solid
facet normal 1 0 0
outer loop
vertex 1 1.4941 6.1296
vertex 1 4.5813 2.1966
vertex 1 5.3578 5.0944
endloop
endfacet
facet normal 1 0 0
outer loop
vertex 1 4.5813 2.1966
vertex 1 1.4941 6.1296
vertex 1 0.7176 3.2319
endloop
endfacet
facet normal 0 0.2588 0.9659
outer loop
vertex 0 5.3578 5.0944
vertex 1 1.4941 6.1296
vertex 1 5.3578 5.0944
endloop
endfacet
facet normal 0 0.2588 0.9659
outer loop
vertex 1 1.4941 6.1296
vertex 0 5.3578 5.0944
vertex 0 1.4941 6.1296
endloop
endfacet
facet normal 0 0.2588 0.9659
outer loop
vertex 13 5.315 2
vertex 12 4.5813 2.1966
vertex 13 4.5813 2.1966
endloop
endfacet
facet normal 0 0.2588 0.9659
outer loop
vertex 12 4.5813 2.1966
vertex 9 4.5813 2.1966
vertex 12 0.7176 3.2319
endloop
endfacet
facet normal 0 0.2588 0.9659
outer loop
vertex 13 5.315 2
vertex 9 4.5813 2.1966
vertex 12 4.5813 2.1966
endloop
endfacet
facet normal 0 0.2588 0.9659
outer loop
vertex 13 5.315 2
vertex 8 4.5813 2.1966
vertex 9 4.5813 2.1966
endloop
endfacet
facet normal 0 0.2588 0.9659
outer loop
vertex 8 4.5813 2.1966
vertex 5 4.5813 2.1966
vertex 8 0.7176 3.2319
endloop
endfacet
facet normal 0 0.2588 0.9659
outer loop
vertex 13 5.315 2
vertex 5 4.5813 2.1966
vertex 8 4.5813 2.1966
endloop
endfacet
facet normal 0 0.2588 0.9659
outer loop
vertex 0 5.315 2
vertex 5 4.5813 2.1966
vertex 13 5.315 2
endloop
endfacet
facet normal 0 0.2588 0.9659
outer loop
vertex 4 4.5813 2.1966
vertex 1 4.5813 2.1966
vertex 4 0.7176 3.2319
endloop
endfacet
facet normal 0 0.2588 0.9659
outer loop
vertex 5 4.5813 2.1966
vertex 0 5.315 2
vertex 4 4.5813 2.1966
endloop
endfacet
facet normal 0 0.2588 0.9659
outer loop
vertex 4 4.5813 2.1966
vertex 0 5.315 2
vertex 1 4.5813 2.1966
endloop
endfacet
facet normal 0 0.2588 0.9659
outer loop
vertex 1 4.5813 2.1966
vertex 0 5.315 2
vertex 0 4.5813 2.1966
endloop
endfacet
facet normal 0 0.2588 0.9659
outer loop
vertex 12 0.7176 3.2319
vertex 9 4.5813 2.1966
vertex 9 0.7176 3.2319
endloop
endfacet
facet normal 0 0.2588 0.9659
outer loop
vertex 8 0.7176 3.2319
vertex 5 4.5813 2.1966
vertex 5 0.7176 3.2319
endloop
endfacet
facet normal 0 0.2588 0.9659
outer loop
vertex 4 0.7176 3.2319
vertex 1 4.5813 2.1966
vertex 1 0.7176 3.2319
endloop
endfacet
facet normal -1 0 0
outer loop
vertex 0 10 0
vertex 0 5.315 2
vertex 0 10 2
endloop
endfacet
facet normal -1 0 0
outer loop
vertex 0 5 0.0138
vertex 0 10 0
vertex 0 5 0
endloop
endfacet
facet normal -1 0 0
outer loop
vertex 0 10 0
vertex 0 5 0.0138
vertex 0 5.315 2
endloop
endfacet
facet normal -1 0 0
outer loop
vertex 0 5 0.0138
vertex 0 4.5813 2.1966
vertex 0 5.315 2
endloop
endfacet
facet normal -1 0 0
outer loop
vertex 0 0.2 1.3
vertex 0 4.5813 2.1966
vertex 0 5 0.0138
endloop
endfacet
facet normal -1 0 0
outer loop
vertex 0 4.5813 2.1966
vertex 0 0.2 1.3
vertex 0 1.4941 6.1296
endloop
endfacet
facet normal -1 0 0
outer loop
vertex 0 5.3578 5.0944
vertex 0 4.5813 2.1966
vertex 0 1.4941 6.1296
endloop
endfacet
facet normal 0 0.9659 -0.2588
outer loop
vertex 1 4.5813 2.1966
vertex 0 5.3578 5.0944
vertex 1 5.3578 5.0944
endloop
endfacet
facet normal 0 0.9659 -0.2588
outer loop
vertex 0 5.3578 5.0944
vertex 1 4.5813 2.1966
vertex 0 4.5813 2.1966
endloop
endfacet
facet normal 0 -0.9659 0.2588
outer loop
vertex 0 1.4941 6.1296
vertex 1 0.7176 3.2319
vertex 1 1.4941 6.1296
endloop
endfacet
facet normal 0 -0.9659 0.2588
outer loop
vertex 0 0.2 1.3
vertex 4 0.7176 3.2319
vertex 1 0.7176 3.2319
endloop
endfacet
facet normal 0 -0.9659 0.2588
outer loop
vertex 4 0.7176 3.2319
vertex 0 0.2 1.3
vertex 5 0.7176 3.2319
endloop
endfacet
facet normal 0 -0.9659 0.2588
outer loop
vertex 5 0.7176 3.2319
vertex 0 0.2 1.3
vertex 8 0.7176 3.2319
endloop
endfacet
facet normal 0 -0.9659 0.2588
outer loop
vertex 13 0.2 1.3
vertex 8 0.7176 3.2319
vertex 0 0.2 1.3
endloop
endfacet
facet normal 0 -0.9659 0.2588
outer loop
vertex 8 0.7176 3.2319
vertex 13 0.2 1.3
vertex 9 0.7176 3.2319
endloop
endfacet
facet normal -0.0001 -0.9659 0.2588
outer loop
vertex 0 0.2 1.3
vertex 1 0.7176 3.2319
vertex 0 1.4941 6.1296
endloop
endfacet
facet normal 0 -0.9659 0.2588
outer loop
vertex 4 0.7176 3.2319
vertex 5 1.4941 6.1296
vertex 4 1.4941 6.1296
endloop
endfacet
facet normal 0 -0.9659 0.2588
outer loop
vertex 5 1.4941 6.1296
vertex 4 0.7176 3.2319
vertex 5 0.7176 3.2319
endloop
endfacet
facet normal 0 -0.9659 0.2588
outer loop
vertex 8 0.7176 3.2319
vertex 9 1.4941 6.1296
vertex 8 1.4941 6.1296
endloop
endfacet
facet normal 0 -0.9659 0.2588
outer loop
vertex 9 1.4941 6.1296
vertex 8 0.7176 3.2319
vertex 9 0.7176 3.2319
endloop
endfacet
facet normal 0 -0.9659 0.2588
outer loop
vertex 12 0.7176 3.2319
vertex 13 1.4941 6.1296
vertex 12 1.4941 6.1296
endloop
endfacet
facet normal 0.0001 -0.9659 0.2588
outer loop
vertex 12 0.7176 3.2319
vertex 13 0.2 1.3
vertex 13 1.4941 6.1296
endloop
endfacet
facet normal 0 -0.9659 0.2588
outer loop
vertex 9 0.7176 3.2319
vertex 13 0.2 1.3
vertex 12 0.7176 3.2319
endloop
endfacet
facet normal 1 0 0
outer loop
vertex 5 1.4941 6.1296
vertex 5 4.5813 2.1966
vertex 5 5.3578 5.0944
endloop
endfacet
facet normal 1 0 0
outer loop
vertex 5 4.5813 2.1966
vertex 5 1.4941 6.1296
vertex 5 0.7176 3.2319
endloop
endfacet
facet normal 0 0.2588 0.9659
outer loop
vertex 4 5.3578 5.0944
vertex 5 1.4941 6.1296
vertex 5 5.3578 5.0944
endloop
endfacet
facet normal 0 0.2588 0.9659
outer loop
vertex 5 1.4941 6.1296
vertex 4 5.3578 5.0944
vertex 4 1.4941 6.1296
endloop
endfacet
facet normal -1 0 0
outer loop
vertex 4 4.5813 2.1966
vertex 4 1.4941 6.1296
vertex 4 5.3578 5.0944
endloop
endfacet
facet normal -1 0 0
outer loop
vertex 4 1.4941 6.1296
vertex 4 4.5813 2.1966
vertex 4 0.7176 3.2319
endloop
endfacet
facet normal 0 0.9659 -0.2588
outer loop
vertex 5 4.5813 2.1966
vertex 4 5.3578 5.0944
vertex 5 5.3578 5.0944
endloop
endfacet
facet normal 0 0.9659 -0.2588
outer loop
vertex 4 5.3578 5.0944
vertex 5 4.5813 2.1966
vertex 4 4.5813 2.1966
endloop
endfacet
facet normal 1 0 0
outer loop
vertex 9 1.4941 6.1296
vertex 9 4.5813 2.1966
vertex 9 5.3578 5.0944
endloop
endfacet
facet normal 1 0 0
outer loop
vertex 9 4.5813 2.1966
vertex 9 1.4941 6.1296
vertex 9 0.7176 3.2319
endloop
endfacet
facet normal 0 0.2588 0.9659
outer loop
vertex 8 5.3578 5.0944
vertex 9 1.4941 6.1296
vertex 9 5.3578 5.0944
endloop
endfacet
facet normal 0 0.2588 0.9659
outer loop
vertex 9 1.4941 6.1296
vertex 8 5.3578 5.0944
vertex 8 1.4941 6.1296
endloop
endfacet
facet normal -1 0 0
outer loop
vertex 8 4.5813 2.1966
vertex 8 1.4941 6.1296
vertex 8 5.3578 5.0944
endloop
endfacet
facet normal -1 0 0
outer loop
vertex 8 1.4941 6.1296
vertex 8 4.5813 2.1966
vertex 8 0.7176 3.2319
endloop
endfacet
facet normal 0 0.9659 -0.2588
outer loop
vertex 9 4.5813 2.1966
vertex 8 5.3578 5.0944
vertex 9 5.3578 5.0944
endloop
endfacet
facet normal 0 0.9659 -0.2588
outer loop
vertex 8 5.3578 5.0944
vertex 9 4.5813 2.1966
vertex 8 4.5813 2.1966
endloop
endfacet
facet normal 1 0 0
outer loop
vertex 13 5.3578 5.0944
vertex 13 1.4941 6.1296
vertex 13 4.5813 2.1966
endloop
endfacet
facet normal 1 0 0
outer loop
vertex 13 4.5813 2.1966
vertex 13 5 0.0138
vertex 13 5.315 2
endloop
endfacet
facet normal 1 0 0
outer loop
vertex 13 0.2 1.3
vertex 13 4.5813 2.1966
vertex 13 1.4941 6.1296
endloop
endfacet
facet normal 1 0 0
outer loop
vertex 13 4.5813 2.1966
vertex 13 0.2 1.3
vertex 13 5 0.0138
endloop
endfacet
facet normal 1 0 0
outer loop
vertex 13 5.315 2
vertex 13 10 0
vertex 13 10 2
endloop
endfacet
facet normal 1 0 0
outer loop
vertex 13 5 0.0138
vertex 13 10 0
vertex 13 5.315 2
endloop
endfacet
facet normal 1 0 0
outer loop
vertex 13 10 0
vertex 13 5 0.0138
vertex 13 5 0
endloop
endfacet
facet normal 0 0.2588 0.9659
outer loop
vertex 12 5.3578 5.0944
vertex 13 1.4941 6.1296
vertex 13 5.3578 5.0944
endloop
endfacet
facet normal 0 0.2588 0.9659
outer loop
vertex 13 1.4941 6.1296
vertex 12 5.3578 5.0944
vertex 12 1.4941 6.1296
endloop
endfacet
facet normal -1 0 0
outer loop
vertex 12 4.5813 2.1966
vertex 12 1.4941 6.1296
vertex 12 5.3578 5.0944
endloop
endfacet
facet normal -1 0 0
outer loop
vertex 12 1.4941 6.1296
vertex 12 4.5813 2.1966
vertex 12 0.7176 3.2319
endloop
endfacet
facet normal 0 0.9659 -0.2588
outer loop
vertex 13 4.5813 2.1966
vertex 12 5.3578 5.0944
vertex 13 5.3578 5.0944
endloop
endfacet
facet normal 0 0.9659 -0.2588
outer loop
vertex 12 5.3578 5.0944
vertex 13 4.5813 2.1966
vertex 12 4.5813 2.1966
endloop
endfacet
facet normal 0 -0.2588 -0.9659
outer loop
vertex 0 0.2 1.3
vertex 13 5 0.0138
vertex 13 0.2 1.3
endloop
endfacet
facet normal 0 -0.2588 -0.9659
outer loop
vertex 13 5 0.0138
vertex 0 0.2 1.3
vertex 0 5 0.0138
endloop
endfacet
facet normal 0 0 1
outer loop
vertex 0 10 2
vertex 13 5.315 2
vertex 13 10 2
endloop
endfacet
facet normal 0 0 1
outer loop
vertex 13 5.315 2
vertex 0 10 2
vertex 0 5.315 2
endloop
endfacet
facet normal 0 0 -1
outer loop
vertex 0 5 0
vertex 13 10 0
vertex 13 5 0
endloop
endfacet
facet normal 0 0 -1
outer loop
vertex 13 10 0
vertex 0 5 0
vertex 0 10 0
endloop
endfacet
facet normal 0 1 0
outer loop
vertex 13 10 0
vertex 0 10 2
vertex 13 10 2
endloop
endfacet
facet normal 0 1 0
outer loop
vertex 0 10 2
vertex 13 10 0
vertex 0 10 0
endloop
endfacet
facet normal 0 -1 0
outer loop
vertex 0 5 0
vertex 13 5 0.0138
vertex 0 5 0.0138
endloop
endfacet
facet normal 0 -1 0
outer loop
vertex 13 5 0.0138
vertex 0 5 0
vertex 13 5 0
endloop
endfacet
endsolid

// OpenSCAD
pin_h = 4;
pin_l = 3;
pin_w = 1;
pins_qty = 4;
pin_spacing = 4;
plate_z = 2;
space_between_top_of_plate_and_top_of_pin = 0;

translate([0, .2, 1.3])
rotate([-15, 0, 0]) {
    // pin plate
    cube([(pins_qty - 1) * pin_spacing + 1, pin_h * 1.25, plate_z]);

    // pins
    for (i = [0:1:pins_qty - 1])
        translate([i * pin_spacing, space_between_top_of_plate_and_top_of_pin, plate_z])
            cube([pin_w, pin_h, pin_l]);

}

translate([0, pin_h * 1.25, 0])
    cube([(pins_qty -1) * pin_spacing + 1, 5, plate_z]);
